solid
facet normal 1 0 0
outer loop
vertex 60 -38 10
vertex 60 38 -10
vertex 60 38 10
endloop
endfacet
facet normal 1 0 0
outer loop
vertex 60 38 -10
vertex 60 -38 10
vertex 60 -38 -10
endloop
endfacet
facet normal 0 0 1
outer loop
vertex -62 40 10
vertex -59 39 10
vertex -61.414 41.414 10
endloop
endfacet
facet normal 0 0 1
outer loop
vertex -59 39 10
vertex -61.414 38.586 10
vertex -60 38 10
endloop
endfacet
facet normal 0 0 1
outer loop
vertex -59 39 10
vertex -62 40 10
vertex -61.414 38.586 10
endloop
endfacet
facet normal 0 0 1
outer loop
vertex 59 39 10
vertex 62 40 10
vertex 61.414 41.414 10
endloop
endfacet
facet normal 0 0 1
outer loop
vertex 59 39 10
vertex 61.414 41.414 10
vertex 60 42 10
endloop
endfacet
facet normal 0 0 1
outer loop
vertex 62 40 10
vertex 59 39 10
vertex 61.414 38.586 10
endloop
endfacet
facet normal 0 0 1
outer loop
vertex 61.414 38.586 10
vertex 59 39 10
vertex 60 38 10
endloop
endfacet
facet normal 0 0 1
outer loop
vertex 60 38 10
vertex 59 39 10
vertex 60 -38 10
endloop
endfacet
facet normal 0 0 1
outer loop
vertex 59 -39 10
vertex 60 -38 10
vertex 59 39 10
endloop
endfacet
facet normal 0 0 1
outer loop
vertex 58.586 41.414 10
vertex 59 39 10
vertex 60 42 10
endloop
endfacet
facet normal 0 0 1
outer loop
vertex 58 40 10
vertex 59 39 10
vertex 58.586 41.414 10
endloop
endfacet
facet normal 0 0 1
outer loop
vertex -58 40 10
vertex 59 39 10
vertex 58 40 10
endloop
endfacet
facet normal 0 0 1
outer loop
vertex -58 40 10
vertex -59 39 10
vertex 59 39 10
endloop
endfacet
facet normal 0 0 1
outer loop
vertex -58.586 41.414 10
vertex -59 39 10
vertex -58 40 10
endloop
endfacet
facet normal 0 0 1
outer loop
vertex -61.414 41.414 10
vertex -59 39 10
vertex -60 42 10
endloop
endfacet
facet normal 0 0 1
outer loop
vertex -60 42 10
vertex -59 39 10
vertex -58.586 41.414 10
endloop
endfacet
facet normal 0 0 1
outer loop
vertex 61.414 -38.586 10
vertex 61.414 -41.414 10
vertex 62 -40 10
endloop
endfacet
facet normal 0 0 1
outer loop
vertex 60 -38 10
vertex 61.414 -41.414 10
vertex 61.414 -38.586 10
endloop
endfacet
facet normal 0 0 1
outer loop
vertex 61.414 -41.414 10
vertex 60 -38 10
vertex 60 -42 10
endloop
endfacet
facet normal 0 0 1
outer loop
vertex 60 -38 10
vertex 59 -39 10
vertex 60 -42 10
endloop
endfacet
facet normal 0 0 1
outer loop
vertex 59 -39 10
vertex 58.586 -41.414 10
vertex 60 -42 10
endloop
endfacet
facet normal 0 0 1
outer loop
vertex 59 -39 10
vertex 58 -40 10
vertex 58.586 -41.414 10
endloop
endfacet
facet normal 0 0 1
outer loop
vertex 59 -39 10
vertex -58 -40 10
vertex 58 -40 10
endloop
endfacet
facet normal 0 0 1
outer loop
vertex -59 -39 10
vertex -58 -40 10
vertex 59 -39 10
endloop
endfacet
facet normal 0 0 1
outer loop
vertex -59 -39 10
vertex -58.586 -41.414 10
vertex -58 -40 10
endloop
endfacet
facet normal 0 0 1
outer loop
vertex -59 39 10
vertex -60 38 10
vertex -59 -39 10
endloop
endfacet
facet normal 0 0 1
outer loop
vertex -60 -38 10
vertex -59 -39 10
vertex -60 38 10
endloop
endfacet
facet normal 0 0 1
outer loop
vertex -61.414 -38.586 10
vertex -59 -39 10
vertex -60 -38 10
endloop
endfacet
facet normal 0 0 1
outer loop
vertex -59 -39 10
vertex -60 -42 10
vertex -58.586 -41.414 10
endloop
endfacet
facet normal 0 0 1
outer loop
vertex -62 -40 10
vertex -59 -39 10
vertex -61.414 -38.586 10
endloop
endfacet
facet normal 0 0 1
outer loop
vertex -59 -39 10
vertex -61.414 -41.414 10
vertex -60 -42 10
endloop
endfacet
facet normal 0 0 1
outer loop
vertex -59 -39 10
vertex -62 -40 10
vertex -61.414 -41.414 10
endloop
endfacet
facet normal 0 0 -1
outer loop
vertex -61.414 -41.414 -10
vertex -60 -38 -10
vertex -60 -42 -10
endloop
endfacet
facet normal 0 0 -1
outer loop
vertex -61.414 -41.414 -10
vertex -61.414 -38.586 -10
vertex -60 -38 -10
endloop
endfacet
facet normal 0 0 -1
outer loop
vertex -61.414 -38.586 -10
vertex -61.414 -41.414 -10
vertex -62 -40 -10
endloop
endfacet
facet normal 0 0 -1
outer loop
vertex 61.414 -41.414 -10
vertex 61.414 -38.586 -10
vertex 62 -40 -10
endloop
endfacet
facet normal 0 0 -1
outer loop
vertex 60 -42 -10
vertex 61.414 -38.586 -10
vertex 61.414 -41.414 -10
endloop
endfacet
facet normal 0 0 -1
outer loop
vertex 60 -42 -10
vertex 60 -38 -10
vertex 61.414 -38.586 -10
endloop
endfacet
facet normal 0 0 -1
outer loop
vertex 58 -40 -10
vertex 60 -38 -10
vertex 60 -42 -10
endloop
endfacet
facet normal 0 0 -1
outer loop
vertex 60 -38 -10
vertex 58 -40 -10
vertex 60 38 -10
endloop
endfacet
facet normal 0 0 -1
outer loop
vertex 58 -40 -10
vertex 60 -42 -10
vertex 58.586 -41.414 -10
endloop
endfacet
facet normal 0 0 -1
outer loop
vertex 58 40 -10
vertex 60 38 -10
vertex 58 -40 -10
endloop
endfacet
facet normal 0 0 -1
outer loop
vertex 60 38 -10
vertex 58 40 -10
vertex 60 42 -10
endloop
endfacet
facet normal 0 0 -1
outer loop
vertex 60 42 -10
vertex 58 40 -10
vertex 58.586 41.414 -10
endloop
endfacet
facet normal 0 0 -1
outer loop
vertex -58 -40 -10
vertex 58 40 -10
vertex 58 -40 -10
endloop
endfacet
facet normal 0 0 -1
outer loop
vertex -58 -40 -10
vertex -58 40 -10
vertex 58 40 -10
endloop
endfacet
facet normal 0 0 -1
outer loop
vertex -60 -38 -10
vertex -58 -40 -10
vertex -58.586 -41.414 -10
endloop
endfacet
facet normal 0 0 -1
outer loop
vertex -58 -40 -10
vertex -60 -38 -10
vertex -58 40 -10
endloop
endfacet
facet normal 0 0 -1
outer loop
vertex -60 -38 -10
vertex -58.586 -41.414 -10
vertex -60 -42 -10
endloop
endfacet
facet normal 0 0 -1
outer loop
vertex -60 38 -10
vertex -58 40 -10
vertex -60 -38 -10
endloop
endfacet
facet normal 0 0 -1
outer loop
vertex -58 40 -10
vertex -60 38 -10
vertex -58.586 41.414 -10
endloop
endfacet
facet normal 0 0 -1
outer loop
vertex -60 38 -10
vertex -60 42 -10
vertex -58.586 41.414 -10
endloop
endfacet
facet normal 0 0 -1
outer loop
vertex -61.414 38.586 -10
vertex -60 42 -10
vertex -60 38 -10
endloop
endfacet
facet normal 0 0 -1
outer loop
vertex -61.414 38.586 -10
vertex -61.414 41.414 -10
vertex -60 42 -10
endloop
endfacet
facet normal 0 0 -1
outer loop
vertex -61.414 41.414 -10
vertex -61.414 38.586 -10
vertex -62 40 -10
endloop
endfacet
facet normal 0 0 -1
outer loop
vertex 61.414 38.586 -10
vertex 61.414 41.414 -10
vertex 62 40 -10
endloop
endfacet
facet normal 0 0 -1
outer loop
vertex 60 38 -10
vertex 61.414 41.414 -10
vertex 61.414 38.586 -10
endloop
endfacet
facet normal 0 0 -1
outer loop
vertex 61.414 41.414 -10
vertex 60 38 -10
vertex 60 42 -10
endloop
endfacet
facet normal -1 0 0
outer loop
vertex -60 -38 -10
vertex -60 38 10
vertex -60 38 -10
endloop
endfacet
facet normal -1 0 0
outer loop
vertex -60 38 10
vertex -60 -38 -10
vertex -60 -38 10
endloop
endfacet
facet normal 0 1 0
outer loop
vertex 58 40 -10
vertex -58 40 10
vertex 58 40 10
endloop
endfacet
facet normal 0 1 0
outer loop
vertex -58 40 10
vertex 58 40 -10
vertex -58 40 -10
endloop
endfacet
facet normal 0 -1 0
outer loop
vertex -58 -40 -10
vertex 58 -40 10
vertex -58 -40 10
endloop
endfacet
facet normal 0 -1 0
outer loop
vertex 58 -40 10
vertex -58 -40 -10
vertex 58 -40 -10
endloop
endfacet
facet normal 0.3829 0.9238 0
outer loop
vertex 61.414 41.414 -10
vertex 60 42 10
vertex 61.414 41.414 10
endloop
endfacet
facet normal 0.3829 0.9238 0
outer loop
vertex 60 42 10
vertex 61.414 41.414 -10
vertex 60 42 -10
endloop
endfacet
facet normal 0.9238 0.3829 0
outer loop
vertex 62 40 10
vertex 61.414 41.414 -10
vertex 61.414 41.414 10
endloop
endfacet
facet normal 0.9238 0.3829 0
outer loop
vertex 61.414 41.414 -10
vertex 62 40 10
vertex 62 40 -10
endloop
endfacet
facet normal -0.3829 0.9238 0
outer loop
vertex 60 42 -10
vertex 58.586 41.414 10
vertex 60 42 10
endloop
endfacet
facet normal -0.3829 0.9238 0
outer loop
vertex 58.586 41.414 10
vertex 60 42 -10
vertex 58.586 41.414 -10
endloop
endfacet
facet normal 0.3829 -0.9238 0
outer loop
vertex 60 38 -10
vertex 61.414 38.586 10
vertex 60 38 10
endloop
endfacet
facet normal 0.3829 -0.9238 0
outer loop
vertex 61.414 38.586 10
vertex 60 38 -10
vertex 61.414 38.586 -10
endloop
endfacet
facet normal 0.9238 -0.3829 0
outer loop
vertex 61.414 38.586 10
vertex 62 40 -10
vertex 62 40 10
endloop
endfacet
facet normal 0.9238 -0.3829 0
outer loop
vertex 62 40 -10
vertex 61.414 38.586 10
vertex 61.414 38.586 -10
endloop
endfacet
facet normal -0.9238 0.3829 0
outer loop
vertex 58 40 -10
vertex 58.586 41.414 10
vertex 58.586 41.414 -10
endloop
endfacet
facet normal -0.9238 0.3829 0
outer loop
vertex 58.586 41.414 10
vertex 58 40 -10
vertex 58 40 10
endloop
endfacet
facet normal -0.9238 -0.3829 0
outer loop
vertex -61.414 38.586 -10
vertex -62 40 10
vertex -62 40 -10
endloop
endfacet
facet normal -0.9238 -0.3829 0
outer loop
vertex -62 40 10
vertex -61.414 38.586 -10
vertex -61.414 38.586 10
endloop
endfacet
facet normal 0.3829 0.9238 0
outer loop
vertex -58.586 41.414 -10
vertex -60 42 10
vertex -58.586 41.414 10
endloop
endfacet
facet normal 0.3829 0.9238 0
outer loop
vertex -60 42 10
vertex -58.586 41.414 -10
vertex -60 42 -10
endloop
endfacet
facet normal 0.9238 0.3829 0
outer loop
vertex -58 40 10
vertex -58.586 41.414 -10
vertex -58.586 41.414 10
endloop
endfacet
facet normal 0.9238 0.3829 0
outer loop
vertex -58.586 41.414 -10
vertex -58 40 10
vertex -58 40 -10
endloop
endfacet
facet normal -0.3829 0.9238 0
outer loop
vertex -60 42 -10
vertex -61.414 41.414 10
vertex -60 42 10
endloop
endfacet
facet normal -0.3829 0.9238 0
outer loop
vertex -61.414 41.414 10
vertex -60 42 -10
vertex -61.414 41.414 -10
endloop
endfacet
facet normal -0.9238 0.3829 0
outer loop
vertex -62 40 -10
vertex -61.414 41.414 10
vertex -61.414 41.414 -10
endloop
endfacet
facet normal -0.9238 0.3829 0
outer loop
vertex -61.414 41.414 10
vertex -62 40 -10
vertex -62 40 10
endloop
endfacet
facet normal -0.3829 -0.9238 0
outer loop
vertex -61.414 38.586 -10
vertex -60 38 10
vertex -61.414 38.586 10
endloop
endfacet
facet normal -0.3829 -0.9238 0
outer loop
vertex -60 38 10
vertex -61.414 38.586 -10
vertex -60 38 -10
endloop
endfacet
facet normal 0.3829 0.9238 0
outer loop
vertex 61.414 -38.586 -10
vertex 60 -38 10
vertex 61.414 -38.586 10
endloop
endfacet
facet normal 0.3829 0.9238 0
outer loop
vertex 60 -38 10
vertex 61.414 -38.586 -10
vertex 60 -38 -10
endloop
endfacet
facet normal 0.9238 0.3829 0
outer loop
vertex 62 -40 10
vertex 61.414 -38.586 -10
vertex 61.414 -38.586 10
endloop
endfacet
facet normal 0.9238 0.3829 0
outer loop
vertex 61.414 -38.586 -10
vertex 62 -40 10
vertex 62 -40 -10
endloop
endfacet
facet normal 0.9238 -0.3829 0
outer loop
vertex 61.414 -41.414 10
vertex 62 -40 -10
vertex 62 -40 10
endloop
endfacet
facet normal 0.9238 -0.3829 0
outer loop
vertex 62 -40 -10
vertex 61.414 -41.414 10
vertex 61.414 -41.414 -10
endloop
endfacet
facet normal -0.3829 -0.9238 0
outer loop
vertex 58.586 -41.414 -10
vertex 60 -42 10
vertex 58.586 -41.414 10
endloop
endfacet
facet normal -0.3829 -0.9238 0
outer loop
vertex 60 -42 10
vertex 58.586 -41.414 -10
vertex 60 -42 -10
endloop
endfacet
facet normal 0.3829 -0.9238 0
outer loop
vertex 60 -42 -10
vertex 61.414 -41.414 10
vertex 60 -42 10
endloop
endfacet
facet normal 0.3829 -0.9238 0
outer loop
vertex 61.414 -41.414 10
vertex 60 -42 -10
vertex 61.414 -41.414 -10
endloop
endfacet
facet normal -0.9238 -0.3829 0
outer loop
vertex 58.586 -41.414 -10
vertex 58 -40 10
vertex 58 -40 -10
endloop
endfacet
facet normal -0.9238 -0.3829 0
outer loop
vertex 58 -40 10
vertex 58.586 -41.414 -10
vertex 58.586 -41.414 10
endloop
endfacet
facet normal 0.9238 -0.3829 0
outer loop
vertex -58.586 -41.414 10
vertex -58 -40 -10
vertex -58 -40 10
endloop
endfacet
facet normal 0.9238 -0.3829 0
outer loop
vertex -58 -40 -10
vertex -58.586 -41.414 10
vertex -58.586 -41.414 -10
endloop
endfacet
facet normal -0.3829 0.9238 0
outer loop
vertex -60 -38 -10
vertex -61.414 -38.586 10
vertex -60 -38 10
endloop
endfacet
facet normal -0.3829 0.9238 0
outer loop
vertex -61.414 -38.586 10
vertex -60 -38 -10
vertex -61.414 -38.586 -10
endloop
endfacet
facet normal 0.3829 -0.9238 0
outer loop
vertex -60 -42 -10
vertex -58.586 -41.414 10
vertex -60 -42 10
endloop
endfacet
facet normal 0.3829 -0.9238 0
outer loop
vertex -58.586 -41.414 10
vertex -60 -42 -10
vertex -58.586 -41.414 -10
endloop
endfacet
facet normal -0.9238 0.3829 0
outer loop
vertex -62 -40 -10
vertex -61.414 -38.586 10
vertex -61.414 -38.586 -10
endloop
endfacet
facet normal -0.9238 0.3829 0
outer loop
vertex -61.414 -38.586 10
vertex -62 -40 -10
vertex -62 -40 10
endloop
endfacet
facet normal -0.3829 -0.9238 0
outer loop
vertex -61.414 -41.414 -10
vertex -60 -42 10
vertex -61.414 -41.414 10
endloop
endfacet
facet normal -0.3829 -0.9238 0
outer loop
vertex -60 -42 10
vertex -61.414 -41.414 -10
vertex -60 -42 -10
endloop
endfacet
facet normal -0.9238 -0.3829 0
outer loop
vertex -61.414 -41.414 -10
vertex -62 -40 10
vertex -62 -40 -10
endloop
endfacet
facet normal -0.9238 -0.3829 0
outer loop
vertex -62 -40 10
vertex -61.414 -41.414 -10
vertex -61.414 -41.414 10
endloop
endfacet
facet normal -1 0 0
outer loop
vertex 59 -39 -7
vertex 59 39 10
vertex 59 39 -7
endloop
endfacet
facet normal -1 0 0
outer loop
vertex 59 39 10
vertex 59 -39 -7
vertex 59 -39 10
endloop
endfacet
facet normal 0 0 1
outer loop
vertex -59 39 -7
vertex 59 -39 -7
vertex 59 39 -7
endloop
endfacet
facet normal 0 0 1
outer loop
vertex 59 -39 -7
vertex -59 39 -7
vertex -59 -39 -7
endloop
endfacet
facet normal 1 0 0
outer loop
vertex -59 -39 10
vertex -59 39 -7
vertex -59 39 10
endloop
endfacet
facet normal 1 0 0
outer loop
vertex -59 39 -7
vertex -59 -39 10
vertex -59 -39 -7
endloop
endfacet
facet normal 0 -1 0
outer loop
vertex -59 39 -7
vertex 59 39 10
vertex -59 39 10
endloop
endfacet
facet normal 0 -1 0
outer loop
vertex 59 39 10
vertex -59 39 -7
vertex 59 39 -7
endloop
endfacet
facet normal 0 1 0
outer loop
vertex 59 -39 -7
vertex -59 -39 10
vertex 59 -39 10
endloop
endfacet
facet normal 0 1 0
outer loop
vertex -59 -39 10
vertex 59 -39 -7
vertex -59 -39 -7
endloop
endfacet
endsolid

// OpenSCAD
case_length 	= 120;
case_width 		= 80;
case_height 	= 20;
case_thickness	= 2;

case_corner_diameter = 4;

dht11_lenght	= 10;
dht11_width		= 10;
dht_height		= 10;

difference (){
	union (){
		cube([case_length, case_width, case_height], center = true);
		translate ([case_length/2, case_width/2, 0]){
		corner();
			}
		translate ([-case_length/2, case_width/2, 0]){
			corner();
			}
		translate ([case_length/2, -case_width/2, 0]){
			corner();
			}
		translate ([-case_length/2, -case_width/2, 0]){
			corner();
			}
		}

	translate ([0,0,case_thickness]){
		cube([case_length - case_thickness, case_width - case_thickness, case_height - case_thickness], center = true);
	}
}

module corner(){
	cylinder (r = case_corner_diameter/2, h = case_height, center = true, $fn = 8);
}
